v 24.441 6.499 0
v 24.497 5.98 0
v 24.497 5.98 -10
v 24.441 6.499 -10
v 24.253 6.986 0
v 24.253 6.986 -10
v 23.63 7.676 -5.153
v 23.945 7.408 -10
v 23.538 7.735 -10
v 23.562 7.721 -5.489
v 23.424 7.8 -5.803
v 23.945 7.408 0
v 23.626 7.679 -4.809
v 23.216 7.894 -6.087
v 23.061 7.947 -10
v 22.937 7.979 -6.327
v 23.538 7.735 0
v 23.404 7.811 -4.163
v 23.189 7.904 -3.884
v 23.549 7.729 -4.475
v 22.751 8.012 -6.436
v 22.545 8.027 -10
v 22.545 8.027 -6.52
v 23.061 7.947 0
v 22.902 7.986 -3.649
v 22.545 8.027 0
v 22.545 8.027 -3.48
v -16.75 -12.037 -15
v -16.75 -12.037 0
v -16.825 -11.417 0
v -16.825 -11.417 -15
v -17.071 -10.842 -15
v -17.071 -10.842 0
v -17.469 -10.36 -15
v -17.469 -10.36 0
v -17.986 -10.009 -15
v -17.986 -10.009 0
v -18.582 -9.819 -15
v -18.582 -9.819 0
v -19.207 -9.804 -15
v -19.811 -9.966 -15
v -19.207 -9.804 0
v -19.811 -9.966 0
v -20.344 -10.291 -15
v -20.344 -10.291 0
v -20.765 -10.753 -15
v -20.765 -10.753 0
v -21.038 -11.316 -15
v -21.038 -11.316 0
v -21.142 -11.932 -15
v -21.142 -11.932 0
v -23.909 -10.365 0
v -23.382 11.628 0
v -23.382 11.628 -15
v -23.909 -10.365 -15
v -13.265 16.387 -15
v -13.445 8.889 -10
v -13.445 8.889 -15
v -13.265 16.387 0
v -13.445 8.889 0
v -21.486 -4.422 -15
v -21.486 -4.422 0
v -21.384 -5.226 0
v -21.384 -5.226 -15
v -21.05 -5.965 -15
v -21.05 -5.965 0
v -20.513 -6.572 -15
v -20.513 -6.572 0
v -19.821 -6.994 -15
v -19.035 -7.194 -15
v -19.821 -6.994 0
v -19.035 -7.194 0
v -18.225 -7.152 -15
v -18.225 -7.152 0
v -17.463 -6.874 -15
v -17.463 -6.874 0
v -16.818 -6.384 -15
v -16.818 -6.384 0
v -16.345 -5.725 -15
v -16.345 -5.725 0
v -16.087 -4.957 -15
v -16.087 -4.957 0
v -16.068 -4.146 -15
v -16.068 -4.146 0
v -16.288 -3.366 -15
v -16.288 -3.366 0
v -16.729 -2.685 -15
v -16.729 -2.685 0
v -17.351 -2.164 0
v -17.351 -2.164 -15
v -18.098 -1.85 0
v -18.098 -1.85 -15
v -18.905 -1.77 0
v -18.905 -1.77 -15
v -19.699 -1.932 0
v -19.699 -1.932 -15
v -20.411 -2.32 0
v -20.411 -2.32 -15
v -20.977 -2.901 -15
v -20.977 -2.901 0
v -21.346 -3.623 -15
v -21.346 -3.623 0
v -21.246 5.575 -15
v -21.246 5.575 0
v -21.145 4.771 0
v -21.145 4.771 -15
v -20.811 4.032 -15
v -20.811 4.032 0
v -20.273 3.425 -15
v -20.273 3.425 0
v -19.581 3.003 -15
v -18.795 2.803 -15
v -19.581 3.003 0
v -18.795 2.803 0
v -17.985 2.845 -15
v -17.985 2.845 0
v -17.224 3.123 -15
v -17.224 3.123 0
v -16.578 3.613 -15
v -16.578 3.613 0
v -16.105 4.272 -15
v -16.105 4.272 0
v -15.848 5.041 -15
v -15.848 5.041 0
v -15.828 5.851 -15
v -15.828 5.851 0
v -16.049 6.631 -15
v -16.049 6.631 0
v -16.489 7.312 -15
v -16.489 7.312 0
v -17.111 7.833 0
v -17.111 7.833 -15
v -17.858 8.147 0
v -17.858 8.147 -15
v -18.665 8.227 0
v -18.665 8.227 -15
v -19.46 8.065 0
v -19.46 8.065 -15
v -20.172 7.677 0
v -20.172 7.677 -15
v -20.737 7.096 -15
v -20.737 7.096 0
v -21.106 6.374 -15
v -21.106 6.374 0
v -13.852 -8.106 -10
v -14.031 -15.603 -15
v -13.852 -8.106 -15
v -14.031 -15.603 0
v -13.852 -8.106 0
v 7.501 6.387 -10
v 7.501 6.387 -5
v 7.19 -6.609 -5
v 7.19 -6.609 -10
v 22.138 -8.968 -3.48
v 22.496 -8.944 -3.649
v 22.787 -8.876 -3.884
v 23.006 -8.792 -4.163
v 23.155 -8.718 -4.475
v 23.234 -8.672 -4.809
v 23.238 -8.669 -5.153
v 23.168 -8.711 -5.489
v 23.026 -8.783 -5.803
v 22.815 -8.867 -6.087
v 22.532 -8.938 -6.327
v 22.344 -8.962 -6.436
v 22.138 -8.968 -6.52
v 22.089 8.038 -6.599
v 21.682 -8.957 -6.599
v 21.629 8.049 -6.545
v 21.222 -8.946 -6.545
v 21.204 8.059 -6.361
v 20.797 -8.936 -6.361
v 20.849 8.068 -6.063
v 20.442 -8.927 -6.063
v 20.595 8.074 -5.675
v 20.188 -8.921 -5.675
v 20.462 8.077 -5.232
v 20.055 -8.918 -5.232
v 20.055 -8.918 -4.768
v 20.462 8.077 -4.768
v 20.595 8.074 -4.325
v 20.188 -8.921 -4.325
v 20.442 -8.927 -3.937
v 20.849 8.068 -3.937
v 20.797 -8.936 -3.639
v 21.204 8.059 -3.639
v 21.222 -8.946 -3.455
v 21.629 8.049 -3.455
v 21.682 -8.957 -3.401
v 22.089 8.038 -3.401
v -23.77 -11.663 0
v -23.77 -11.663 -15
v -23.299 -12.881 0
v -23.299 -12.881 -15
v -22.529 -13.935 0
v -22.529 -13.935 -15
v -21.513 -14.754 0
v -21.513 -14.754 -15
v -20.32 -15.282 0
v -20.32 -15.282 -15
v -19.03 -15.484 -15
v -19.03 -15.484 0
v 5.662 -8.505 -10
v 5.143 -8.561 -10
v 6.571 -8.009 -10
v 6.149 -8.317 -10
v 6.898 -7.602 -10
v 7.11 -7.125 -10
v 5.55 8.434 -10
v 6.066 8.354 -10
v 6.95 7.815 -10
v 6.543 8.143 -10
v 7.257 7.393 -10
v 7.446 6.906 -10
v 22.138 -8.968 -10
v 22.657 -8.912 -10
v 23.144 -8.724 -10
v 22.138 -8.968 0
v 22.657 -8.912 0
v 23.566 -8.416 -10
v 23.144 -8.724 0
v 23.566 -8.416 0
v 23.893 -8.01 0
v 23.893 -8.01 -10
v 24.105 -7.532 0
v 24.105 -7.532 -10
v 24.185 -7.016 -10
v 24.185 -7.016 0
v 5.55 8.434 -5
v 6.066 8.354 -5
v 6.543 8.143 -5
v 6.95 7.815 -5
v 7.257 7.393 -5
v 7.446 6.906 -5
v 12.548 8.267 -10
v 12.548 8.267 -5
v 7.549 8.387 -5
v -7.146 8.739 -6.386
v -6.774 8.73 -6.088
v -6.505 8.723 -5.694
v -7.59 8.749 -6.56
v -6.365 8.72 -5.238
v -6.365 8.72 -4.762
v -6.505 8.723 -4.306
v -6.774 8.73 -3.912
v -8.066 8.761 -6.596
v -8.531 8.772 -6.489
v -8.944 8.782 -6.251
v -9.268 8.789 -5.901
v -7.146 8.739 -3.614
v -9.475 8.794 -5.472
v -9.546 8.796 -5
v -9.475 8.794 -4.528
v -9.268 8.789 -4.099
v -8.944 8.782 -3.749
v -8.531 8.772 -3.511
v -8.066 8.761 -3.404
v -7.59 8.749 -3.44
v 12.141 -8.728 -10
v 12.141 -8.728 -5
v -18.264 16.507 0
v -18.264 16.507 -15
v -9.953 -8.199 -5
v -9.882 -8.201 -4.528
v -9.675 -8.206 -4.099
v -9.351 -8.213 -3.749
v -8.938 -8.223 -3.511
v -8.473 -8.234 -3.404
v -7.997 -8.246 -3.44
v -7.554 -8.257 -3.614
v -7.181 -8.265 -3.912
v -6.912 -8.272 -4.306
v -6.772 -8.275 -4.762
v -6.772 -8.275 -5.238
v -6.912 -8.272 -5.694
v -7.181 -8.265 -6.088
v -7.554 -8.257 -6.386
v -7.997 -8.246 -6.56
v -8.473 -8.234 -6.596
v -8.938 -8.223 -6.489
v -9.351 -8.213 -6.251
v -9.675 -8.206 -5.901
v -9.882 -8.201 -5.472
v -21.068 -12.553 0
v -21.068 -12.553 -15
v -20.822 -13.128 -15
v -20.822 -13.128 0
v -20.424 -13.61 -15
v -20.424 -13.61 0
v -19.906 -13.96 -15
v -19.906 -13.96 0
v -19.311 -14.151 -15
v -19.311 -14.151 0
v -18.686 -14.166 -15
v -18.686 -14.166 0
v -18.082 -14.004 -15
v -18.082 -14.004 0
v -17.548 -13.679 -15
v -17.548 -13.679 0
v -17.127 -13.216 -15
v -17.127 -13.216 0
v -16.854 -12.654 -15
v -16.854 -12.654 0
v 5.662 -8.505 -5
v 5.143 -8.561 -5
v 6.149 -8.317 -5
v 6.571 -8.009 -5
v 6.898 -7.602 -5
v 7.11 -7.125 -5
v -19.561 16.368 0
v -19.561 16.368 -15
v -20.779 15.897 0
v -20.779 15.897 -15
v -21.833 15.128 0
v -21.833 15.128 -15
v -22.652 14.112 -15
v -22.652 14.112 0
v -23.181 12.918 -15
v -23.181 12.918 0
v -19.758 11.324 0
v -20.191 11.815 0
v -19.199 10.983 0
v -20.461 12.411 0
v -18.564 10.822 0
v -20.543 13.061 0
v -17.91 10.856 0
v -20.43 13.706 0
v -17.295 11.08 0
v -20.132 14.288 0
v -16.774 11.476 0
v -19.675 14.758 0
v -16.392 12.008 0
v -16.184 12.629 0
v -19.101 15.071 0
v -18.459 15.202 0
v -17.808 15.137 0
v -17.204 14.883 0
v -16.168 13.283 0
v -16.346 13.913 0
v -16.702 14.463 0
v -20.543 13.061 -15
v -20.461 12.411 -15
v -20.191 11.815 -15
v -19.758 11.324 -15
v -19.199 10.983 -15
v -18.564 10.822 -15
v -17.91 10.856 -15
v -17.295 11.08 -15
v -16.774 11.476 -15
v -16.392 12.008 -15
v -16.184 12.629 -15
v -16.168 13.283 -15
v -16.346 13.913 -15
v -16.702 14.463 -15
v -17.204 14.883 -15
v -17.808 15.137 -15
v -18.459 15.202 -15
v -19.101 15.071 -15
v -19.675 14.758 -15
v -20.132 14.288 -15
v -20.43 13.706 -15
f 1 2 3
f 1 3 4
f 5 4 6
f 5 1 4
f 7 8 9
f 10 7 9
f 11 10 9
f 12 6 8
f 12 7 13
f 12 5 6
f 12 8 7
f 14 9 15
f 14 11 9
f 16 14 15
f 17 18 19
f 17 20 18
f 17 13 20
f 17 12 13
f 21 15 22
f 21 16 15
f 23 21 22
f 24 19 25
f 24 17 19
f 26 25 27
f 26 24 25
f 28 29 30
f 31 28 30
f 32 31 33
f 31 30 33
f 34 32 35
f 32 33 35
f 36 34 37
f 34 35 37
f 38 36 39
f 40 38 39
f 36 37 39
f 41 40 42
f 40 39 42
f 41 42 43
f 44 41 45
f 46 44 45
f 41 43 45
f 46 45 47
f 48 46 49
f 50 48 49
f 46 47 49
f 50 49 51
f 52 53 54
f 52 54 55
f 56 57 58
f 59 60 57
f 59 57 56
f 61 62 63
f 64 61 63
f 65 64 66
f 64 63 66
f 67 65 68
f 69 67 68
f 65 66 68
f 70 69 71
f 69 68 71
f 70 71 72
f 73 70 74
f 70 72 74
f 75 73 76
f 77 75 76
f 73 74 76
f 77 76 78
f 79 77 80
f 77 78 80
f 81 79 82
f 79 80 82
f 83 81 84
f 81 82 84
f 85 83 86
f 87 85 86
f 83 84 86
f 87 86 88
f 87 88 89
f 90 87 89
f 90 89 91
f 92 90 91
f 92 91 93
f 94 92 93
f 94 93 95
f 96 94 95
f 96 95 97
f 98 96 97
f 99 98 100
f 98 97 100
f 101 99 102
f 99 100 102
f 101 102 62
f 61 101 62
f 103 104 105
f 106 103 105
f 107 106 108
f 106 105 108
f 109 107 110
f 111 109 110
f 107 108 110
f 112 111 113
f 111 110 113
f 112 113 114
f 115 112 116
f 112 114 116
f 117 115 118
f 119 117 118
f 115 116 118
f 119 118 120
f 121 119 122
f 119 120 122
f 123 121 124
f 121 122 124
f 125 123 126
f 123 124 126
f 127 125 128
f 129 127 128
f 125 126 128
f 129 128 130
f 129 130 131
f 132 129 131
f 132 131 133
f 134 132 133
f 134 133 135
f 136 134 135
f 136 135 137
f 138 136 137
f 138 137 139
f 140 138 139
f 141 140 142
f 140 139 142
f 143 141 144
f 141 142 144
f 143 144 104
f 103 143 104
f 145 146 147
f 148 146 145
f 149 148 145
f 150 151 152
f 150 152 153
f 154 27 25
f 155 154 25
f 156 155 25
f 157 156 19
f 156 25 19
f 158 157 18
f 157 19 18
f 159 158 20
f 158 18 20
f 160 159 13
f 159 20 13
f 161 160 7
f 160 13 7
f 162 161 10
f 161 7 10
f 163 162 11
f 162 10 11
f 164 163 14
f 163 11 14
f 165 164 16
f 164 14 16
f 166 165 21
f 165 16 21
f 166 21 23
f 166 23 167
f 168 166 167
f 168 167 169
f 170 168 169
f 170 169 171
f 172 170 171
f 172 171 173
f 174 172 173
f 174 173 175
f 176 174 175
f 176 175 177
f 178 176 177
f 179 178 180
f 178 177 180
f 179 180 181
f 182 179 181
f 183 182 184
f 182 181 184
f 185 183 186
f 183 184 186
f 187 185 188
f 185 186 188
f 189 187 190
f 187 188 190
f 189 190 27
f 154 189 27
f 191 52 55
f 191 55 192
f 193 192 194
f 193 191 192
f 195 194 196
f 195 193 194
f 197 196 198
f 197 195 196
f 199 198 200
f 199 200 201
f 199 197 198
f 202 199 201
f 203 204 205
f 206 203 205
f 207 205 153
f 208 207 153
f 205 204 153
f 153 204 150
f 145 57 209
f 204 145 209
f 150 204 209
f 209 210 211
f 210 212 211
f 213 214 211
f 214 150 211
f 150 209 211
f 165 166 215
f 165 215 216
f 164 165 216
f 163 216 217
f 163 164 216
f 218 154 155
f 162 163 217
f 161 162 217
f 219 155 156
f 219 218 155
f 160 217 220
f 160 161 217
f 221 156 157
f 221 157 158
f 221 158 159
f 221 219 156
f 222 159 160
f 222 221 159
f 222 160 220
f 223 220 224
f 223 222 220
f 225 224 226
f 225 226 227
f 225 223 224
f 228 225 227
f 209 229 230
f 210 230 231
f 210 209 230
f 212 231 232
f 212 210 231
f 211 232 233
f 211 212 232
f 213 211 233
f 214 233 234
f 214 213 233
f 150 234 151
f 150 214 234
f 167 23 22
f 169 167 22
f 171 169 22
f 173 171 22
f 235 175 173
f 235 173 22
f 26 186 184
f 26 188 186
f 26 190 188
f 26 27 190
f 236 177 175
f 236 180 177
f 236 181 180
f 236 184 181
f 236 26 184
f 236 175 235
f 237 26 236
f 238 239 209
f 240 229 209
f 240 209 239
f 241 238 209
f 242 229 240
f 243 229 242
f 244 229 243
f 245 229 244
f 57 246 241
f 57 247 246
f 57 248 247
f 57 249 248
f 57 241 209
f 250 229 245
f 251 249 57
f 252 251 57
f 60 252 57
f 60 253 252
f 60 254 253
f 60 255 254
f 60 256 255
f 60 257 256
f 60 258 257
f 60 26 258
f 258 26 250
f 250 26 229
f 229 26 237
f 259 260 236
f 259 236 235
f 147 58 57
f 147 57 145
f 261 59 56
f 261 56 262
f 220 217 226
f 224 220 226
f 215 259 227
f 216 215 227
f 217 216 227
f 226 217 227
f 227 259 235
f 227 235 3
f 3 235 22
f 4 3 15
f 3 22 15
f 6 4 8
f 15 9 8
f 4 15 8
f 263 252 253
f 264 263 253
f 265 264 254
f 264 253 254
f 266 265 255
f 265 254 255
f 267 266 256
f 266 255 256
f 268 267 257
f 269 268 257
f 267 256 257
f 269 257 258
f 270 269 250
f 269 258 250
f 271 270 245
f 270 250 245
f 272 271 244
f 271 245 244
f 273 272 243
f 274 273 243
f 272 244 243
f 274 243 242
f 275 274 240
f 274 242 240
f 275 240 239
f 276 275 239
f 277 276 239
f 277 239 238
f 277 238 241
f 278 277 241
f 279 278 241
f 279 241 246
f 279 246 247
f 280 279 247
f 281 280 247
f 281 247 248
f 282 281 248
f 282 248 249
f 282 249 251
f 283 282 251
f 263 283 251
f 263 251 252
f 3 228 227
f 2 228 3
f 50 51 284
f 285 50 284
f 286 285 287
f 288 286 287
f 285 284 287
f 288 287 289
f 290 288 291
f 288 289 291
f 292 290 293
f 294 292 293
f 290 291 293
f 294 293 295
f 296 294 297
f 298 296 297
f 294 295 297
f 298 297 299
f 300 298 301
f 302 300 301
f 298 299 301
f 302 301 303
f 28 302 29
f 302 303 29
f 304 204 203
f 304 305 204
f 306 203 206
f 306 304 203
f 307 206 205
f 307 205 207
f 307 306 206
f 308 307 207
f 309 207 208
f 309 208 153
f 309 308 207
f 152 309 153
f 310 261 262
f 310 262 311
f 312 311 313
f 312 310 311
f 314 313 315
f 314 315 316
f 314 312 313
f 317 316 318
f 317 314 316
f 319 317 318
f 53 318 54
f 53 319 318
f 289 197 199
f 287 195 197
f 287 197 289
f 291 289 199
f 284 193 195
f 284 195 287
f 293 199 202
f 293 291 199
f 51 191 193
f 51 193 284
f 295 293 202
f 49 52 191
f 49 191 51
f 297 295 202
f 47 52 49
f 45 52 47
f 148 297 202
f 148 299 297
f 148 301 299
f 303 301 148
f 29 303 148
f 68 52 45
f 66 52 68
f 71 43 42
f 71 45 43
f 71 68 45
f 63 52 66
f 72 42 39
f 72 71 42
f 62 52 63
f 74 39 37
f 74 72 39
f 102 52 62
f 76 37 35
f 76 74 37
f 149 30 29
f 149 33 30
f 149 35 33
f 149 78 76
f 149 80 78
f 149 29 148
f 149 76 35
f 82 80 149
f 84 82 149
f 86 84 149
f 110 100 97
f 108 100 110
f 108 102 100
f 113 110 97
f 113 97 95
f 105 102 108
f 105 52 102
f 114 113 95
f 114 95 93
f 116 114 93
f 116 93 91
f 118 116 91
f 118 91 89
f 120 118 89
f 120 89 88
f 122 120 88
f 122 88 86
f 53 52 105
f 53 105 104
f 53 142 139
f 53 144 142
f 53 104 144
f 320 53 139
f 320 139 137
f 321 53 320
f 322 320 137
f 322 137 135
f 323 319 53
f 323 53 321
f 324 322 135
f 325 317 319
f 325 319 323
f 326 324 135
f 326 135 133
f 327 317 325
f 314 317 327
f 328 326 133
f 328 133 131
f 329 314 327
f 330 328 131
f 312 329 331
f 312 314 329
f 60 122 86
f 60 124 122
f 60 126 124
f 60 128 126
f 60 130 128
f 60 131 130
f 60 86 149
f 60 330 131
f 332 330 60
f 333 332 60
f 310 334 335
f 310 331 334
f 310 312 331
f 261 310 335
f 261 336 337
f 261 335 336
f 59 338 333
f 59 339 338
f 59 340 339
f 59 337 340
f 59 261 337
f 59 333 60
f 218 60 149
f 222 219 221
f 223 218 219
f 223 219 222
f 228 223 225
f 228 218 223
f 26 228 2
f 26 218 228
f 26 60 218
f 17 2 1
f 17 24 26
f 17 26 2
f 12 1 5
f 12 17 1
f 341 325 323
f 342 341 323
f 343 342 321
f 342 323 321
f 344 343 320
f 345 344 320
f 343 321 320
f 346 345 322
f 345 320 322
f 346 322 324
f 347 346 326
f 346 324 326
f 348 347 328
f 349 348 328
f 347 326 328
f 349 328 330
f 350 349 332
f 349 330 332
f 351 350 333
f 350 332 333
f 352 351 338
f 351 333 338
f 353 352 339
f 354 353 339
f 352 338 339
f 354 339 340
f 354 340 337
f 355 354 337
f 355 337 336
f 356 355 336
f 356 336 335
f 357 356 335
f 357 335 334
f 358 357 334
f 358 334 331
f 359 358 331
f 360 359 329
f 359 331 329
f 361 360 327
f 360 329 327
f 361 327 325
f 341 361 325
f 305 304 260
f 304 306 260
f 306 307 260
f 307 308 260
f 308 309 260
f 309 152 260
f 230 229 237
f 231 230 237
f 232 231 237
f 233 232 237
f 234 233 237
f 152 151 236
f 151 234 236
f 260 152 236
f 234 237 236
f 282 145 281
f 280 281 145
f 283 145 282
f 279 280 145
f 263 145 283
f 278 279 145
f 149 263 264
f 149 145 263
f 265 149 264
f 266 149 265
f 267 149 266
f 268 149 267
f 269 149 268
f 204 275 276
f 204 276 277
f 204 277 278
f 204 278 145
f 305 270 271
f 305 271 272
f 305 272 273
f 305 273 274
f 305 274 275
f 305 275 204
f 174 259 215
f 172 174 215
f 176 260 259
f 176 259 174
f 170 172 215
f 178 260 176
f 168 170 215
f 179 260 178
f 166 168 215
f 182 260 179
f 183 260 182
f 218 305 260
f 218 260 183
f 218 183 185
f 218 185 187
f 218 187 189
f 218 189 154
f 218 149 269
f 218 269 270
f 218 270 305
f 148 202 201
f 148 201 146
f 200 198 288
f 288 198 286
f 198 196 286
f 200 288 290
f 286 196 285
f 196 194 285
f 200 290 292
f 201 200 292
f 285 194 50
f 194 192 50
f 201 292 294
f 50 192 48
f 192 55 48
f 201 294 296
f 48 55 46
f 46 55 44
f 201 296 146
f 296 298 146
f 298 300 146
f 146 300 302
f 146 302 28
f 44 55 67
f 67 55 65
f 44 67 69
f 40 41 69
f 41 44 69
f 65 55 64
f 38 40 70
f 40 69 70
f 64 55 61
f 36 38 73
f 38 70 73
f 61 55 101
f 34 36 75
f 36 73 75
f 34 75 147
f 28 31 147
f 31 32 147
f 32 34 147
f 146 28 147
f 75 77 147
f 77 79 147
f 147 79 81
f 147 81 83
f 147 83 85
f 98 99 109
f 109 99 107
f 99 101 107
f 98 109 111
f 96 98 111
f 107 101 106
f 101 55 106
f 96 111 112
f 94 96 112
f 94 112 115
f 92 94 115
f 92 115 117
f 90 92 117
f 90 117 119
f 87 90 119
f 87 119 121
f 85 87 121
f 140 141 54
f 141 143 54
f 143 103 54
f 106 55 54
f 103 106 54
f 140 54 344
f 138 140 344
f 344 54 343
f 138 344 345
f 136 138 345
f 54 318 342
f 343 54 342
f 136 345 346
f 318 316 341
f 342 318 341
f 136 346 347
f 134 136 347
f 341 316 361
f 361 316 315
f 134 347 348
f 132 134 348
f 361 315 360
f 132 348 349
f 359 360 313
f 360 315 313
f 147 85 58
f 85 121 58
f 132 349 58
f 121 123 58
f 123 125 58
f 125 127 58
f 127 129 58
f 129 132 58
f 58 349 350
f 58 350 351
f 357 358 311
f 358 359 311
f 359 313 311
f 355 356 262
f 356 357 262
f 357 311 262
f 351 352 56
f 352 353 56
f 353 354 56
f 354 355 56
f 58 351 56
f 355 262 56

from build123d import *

# Parameters (mm, degrees)
EXTRUDE_1_DEPTH     = 15
CUT_EXTRUDE_1_DEPTH = 5
SKETCH_3_R          = 1.6
SKETCH_3_W          = 5
SKETCH_3_H          = 5
CUT_EXTRUDE_2_DEPTH = 22
FILLET_1_R          = 2


with BuildPart() as part:
    # 草图1 → 凸台-拉伸1 (new body)
    with BuildSketch(Plane.XY):
        with BuildLine():
            Line((24.185160084, -7.016301696), (24.496510845, 5.979969335))
            ThreePointArc((24.496510845, 5.979969335), (23.944762934, 7.407806858), (22.544984649, 8.027295764))
            Line((22.544984649, 8.027295764), (-13.444688974, 8.889497871))
            Line((-13.444688974, 8.889497871), (-13.265063535, 16.387346543))
            Line((-13.265063535, 16.387346543), (-18.263629316, 16.507096835))
            ThreePointArc((-18.263629316, 16.507096835), (-21.833223125, 15.127727058), (-23.38194539, 11.628281347))
            Line((-23.38194539, 11.628281347), (-23.908846678, -10.36540809))
            ThreePointArc((-23.908846678, -10.36540809), (-22.5294769, -13.935001898), (-19.030031189, -15.483724163))
            Line((-19.030031189, -15.483724163), (-14.031465408, -15.603474456))
            Line((-14.031465408, -15.603474456), (-13.851839969, -8.105625784))
            Line((-13.851839969, -8.105625784), (22.137833654, -8.967827891))
            ThreePointArc((22.137833654, -8.967827891), (23.565671178, -8.41607998), (24.185160084, -7.016301696))
        make_face()
        with BuildLine():
            ThreePointArc((-16.75044735, -12.037331753), (-18.893602347, -9.788969482), (-21.141964619, -11.93212448))
            ThreePointArc((-21.141964619, -11.93212448), (-18.998809621, -14.180486751), (-16.75044735, -12.037331753))
        make_face(mode=Mode.SUBTRACT)
        with BuildLine():
            ThreePointArc((-16.04728092, -4.552025517), (-18.701434473, -1.76757982), (-21.48588017, -4.421733373))
            ThreePointArc((-21.48588017, -4.421733373), (-18.831726617, -7.20617907), (-16.04728092, -4.552025517))
        make_face(mode=Mode.SUBTRACT)
        with BuildLine():
            ThreePointArc((-15.807780335, 5.445106045), (-18.461933888, 8.229551742), (-21.246379585, 5.575398189))
            ThreePointArc((-21.246379585, 5.575398189), (-18.592226032, 2.790952492), (-15.807780335, 5.445106045))
        make_face(mode=Mode.SUBTRACT)
        with BuildLine():
            ThreePointArc((-16.151695887, 12.955497152), (-18.294850884, 15.203859423), (-20.543213156, 13.060704426))
            ThreePointArc((-20.543213156, 13.060704426), (-18.400058158, 10.812342154), (-16.151695887, 12.955497152))
        make_face(mode=Mode.SUBTRACT)
    extrude(amount=-EXTRUDE_1_DEPTH)

    # 草图2 → 切除-拉伸1 (cut)
    with BuildSketch(Plane(origin=(0, 0, -15), x_dir=(-1, 0, 0), z_dir=(0, 0, -1))):
        Polygon((13.444688974, 8.889497871), (13.851839969, -8.105625784), (-33.415838559, -15.121344773), (-27.379501609, 15.743180277), align=None)
    extrude(amount=-CUT_EXTRUDE_1_DEPTH, mode=Mode.SUBTRACT)

    # 草图3 → 切除-拉伸2 (cut)
    with BuildSketch(Plane(origin=(0.205130979, 8.562490084, 0), x_dir=(0.9997131562086496, -0.02395005852477245, 0), z_dir=(0.02395005852477245, 0.9997131562086496, 0))):
        with Locations(Location((21.846263557, 5, 0), (0, 0, 288.209956864))):
            Circle(SKETCH_3_R)
        with Locations(Location((-8.153736443, 5, 0), (0, 0, 180))):
            Circle(SKETCH_3_R)
        with Locations((9.846263557, 7.5)):
            Rectangle(SKETCH_3_W, SKETCH_3_H)
    extrude(amount=-CUT_EXTRUDE_2_DEPTH, mode=Mode.SUBTRACT)

    # 圆角1
    fillet_1_edges = [part.edges().sort_by_distance(p)[0] for p in [
        (7.142136311, -8.608577013, -7.5),
        (7.549287306, 8.386546642, -7.5),
    ]]
    fillet(fillet_1_edges, radius=FILLET_1_R)


solid = part.part
